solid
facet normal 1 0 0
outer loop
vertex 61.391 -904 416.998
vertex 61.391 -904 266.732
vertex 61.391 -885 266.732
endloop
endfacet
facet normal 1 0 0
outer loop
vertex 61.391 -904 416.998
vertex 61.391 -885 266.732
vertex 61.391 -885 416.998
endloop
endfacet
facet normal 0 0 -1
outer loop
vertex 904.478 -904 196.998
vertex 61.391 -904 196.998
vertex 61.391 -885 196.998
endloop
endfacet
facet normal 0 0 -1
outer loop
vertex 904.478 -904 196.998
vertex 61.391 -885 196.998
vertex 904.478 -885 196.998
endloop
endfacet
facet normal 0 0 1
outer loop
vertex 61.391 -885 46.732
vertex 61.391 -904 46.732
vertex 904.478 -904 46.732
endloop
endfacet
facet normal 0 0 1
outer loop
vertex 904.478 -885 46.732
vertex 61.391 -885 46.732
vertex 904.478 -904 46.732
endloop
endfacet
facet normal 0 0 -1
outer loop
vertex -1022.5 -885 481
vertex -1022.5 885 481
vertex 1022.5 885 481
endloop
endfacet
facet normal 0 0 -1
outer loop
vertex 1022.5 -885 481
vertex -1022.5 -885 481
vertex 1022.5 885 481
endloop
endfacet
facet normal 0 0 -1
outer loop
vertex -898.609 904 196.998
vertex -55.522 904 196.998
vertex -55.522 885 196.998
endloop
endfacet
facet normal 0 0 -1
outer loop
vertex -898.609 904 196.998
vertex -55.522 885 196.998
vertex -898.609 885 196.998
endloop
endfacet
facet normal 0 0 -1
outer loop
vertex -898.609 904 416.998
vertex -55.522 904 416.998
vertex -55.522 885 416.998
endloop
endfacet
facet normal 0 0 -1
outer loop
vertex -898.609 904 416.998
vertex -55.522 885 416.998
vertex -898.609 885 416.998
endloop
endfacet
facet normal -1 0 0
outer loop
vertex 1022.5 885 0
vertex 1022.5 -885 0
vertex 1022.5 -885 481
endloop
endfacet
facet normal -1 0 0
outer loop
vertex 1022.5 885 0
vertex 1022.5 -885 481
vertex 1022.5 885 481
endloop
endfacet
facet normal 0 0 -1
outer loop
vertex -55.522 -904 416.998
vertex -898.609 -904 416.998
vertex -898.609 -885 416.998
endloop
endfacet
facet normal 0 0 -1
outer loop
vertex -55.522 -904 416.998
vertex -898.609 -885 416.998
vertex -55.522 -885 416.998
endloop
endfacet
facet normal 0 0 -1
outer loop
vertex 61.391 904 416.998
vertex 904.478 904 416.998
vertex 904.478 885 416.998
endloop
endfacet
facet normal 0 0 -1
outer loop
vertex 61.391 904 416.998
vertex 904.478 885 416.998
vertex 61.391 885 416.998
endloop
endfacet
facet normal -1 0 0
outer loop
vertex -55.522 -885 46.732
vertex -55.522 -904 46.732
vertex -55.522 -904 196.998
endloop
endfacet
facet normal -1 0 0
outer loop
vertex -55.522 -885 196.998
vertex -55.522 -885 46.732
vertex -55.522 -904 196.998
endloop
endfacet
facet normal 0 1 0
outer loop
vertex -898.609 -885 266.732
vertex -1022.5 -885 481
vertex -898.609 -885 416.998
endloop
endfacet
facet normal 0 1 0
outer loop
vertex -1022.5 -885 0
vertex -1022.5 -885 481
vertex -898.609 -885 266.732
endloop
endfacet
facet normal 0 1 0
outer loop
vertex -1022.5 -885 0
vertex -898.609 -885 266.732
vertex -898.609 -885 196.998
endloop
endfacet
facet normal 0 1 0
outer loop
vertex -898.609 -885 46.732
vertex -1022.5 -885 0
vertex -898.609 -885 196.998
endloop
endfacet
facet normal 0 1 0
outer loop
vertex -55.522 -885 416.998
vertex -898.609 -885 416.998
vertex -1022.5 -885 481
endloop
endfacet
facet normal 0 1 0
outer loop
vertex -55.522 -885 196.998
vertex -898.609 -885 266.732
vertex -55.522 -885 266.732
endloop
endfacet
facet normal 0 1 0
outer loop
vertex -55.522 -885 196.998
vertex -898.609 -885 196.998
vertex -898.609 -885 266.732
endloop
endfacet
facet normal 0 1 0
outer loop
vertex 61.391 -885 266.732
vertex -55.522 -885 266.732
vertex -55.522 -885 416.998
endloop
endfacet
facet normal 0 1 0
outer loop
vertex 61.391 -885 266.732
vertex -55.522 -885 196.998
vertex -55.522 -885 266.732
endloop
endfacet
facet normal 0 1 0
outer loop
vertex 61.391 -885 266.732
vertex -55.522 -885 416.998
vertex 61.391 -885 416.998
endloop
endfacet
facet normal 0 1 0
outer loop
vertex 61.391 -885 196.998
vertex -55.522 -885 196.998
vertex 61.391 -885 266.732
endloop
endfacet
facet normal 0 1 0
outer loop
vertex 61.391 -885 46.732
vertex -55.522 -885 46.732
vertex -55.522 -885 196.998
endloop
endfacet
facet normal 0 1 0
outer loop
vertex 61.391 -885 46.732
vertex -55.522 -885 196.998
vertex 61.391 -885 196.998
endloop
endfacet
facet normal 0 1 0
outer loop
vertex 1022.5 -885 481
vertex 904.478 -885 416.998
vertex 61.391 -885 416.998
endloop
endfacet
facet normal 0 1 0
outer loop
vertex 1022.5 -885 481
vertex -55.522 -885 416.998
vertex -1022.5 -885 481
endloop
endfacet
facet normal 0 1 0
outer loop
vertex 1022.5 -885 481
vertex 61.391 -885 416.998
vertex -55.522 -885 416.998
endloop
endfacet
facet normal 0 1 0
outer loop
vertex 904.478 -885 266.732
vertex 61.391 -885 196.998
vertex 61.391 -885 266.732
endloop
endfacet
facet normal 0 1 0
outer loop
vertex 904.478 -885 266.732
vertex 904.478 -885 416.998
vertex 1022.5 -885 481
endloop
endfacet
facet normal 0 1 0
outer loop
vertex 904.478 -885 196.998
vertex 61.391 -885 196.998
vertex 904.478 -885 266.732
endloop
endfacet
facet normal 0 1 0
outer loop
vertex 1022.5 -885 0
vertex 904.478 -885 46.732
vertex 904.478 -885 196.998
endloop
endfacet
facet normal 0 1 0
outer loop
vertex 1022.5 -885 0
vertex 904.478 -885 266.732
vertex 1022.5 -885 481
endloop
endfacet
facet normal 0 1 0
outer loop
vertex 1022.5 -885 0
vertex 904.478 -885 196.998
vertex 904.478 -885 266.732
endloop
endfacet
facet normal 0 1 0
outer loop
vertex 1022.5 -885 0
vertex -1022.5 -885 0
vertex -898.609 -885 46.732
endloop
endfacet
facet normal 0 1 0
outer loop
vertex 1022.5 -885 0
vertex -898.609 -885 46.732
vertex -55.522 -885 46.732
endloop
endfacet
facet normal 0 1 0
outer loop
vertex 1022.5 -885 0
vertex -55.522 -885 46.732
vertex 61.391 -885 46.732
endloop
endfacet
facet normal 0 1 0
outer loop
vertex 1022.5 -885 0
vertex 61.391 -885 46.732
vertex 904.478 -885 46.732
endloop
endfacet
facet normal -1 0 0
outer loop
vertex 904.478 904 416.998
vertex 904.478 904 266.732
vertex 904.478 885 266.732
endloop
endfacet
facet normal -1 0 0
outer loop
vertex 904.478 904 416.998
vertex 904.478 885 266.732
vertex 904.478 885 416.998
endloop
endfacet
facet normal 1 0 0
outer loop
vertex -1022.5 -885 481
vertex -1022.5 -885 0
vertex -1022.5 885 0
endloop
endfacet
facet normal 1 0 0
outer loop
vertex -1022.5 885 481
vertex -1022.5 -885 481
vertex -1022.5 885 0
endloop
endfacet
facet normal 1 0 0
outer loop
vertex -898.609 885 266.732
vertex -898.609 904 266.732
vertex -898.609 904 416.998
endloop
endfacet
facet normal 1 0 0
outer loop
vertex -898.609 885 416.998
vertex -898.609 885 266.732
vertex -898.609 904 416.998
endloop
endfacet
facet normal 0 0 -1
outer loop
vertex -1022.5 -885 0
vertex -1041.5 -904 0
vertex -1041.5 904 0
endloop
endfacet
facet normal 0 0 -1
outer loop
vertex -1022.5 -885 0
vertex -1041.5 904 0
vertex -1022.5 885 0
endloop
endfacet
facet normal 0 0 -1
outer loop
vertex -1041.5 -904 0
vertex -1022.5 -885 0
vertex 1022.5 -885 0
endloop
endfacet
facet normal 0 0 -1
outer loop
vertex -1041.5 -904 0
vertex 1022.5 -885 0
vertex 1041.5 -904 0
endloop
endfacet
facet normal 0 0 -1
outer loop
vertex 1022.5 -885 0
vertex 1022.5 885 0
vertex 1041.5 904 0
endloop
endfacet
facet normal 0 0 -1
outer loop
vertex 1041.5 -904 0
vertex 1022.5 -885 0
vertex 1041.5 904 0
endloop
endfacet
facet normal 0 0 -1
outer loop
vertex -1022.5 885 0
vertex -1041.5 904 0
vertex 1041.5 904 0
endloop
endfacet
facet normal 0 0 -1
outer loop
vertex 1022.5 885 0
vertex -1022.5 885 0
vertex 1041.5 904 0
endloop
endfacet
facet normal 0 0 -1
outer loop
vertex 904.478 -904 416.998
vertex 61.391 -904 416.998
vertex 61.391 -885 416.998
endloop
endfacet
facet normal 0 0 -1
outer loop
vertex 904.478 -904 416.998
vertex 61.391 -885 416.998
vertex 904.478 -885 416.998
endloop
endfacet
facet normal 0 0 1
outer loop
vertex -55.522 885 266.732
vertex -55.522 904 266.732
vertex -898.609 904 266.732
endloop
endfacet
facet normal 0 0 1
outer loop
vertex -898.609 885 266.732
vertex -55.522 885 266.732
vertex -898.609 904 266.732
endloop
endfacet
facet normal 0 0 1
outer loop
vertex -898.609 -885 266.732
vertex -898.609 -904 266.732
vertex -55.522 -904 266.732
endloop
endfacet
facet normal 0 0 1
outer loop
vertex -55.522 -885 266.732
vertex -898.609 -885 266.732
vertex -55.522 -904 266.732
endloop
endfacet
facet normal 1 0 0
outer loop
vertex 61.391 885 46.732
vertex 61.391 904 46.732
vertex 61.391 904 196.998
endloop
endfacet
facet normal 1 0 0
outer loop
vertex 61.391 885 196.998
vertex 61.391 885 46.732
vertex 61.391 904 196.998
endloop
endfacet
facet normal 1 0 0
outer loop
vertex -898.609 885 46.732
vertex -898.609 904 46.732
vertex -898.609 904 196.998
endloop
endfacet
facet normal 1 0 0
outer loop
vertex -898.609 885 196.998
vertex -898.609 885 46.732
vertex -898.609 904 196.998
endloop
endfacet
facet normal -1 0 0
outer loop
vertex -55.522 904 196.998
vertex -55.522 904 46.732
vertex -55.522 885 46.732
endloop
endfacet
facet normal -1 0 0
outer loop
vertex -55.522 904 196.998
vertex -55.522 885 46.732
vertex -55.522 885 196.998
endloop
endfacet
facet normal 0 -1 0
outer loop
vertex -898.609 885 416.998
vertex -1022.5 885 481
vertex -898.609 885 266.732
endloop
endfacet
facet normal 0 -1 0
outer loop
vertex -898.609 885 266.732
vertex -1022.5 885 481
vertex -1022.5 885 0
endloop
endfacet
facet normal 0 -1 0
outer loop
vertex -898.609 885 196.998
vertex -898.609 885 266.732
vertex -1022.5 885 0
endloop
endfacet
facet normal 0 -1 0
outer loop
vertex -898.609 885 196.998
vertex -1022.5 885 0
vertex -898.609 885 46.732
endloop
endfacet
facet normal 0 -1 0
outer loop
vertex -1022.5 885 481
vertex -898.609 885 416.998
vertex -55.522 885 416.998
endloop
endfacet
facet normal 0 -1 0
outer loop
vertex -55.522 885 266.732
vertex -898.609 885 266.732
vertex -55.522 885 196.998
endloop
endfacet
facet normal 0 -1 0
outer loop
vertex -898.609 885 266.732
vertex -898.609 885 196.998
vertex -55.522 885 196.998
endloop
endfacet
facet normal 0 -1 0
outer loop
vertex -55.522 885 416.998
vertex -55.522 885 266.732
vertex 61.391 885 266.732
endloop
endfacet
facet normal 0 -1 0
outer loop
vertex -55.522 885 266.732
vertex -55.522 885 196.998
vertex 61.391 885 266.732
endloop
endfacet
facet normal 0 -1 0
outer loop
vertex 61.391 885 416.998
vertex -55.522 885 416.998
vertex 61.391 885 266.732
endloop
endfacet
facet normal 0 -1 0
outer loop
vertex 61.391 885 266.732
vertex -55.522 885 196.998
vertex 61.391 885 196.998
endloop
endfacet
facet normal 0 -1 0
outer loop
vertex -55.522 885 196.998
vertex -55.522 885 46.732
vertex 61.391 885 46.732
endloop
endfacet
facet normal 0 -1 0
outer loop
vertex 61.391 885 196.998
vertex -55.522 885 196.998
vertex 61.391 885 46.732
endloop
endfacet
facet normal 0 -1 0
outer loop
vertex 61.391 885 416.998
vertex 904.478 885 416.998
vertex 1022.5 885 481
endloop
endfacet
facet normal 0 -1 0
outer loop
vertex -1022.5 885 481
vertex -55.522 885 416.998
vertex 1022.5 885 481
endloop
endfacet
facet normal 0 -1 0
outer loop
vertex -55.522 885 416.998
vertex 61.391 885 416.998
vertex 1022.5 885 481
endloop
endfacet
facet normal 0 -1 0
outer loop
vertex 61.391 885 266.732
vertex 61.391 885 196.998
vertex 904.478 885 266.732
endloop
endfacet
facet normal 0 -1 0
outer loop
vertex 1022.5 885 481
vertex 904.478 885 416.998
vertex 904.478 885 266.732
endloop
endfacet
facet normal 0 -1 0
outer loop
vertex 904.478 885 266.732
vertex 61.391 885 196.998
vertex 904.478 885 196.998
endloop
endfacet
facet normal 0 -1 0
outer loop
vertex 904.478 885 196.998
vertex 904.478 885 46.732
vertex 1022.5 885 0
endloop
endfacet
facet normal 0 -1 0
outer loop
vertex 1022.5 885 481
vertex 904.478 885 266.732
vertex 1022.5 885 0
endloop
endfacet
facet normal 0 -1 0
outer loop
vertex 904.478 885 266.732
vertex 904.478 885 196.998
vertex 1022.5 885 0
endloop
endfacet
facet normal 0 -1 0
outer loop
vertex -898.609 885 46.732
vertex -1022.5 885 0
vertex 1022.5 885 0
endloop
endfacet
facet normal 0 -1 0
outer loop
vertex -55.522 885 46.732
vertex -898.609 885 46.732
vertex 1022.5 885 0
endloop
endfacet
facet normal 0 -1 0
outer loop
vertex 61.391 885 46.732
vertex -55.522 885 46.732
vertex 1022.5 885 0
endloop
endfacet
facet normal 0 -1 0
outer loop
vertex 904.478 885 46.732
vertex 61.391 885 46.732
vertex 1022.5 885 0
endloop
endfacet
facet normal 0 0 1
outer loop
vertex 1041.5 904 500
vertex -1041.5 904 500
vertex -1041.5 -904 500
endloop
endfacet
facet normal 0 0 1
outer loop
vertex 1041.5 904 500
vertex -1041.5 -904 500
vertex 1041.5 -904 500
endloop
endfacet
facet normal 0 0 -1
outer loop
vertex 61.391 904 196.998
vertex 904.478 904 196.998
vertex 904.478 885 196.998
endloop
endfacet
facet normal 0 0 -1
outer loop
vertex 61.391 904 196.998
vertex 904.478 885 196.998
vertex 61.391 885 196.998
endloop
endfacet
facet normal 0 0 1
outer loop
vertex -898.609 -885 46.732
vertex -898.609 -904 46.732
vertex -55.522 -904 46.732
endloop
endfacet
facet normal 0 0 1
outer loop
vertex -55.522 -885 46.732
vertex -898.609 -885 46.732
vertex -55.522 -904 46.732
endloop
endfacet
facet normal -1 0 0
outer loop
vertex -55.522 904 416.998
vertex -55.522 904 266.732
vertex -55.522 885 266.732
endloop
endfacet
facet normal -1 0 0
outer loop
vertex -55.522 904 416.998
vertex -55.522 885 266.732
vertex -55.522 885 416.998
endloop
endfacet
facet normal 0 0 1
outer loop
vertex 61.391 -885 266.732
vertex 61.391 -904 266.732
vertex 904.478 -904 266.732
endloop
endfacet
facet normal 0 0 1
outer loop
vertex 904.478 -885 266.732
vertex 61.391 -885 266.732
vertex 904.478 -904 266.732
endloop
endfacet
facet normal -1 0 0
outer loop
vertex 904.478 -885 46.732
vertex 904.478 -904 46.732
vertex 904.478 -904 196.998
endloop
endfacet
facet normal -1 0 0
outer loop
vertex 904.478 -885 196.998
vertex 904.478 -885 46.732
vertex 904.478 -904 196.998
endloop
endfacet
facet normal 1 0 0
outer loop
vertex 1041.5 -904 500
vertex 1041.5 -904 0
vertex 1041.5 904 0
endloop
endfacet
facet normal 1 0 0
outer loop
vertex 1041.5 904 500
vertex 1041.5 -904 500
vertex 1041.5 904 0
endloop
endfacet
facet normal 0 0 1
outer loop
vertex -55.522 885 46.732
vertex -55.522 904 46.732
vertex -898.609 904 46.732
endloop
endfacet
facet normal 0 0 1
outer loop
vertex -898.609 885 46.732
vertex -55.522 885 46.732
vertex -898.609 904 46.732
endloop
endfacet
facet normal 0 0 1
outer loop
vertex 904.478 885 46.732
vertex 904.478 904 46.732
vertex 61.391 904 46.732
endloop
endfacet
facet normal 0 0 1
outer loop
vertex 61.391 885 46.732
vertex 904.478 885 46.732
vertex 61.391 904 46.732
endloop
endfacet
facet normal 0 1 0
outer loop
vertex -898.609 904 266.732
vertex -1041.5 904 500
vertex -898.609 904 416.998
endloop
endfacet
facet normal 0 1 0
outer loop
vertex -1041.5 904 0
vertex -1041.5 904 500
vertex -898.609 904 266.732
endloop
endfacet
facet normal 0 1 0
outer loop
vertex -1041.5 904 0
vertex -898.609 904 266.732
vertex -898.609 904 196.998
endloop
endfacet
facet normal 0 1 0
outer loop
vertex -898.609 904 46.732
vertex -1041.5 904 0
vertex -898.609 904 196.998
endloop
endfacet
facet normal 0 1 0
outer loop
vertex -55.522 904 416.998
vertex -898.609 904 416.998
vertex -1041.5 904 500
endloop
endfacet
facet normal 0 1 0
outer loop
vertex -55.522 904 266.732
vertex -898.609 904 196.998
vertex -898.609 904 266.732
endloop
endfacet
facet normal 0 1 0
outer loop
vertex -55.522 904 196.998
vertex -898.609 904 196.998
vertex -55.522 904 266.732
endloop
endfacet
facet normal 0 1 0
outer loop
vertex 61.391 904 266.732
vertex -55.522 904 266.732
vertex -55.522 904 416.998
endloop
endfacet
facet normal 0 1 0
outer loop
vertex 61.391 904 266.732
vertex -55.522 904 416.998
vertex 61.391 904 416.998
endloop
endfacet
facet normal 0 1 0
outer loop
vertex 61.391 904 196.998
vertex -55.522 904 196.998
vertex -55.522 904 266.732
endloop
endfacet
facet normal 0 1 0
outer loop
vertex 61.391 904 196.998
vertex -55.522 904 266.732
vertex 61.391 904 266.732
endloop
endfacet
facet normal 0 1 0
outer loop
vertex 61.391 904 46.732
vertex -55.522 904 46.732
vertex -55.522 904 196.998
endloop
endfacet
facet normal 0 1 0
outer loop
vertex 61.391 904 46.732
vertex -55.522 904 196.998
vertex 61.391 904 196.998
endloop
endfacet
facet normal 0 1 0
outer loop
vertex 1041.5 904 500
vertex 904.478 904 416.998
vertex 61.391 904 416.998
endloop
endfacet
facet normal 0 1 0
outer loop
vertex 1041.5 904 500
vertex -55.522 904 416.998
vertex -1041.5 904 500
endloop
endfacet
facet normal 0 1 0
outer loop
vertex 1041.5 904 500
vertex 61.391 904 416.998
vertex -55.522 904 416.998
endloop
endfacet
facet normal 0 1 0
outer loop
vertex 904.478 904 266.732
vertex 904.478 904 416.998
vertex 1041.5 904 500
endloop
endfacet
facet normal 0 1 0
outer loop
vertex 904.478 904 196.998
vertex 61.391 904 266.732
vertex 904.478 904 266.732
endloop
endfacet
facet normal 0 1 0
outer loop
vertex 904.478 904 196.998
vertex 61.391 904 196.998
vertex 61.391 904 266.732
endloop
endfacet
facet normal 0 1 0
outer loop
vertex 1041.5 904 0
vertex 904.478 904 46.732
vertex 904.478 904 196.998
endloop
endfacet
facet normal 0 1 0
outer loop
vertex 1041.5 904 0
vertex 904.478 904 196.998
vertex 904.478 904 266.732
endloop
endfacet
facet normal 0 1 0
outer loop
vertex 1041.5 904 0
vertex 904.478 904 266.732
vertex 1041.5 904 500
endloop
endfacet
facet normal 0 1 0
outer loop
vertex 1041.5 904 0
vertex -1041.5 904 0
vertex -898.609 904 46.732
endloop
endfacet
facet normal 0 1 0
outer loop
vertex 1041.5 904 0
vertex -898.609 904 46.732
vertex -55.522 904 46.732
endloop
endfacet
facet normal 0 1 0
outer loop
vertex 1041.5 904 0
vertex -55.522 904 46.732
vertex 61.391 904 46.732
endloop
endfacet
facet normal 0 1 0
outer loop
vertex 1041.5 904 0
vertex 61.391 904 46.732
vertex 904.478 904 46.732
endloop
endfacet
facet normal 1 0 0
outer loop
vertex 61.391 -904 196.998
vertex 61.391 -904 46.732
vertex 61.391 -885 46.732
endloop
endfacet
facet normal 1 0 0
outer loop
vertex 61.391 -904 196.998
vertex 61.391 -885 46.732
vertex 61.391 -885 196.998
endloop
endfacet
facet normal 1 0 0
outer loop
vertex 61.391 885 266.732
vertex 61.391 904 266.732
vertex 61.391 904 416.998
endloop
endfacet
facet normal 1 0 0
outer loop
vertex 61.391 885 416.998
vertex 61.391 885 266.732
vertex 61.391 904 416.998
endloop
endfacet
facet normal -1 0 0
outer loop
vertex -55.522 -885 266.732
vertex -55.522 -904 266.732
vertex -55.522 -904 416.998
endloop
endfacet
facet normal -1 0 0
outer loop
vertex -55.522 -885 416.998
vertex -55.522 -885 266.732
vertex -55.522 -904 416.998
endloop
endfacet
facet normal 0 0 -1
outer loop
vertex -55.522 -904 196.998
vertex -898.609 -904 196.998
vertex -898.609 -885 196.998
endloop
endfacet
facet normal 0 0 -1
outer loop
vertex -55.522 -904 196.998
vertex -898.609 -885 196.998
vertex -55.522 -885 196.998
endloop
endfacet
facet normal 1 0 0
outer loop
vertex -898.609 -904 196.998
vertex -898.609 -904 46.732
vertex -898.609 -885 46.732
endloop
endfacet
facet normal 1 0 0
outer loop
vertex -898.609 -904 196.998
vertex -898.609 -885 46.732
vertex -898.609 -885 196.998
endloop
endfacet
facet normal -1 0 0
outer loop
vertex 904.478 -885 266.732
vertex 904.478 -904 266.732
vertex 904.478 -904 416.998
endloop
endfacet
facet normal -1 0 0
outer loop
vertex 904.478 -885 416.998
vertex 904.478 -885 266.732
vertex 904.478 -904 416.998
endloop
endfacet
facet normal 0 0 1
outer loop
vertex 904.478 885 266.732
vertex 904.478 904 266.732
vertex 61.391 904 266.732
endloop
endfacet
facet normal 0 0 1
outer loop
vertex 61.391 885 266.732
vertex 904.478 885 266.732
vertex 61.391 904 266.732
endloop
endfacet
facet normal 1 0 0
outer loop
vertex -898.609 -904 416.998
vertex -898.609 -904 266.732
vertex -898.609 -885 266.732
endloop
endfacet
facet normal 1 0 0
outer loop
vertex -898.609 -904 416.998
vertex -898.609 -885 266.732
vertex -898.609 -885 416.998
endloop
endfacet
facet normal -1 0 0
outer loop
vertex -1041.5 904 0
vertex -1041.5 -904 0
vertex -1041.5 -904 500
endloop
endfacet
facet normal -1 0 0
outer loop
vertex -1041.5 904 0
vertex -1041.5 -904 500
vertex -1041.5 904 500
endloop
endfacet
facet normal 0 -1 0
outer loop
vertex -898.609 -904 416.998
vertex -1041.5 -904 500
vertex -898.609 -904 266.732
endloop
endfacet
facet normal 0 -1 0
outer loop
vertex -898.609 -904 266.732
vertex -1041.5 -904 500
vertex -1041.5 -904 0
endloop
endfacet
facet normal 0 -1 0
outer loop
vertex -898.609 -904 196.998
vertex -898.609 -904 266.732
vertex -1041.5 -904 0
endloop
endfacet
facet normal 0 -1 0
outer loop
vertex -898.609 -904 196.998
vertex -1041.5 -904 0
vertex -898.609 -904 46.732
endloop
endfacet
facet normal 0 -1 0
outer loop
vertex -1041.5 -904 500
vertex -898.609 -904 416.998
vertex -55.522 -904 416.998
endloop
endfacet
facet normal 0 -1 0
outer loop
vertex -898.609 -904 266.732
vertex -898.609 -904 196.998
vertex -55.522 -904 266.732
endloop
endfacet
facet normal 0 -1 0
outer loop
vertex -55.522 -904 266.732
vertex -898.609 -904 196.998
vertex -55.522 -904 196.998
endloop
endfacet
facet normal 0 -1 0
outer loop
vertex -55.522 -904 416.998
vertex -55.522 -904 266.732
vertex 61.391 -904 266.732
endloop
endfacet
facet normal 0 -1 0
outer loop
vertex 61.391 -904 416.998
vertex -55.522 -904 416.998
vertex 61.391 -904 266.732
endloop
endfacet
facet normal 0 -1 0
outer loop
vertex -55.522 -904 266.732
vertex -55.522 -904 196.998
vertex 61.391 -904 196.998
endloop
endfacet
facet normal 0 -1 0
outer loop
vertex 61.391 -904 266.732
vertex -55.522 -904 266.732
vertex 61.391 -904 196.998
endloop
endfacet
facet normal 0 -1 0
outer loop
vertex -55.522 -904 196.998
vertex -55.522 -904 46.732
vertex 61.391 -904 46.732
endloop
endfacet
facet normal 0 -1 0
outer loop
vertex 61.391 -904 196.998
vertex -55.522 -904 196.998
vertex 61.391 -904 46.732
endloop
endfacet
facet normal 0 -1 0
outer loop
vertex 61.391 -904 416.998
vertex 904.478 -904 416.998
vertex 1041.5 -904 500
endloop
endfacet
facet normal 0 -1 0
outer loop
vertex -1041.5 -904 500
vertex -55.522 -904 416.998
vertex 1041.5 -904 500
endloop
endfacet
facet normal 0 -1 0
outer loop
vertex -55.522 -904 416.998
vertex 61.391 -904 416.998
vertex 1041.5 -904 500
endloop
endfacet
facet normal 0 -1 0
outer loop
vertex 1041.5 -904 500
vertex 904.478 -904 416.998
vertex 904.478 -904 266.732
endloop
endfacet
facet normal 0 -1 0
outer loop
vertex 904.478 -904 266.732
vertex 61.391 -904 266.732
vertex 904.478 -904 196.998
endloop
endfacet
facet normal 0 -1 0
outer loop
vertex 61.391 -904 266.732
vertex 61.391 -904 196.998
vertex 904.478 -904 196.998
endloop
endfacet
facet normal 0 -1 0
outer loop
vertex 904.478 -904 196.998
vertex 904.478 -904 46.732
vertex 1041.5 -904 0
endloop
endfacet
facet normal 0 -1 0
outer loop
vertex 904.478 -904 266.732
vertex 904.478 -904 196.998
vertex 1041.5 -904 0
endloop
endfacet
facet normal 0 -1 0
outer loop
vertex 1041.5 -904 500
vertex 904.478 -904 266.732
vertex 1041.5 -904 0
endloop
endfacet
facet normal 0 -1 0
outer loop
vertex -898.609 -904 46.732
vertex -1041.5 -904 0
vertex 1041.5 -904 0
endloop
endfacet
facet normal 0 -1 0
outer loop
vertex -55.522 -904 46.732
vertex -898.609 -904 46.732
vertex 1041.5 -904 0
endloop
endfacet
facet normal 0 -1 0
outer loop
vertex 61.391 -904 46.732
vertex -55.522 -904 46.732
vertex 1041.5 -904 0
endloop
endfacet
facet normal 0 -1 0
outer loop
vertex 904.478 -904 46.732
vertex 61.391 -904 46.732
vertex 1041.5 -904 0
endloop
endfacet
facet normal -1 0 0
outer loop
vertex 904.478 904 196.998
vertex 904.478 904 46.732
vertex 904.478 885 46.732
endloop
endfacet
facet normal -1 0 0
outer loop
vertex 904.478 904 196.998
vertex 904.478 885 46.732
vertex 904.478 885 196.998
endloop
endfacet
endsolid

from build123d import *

# Parameters (mm, degrees)
F0_W     = 2083
F0_H     = 1808
F1_DEPTH = 500
F2_T     = -19
F3_W     = 843.087125
F3_H     = 150.265902
F4_DEPTH = 19
F5_W     = 843.087125
F5_H     = 150.265902
F6_DEPTH = 19


with BuildPart() as f1:
    # F0 (on Top) → F1 (new body)
    with BuildSketch(Plane.XY):
        Rectangle(F0_W, F0_H)
    extrude(amount=F1_DEPTH)

    # F2
    f2_openings = [f1.faces().sort_by_distance(p)[0] for p in [
        (0, 0, 0),
    ]]
    offset(amount=F2_T, openings=f2_openings)

    # F3 (on face) → F4 (cut, through all)
    with BuildSketch(Plane.XZ.offset(904)):
        with Locations((-477.065479, 341.865197)):
            Rectangle(F3_W, F3_H)
        with Locations((482.93452, 341.865197)):
            Rectangle(F3_W, F3_H)
        with Locations((-477.065479, 121.865197)):
            Rectangle(F3_W, F3_H)
        with Locations((482.93452, 121.865197)):
            Rectangle(F3_W, F3_H)
    extrude(amount=-F4_DEPTH, mode=Mode.SUBTRACT)

    # F5 (on face) → F6 (cut, through all)
    with BuildSketch(Plane(origin=(0, 904, 0), x_dir=(-1, 0, 0), z_dir=(0, 1, 0))):
        with Locations((-482.93452, 341.865197)):
            Rectangle(F5_W, F5_H)
        with Locations((477.065479, 341.865197)):
            Rectangle(F5_W, F5_H)
        with Locations((-482.93452, 121.865197)):
            Rectangle(F5_W, F5_H)
        with Locations((477.065479, 121.865197)):
            Rectangle(F5_W, F5_H)
    extrude(amount=-F6_DEPTH, mode=Mode.SUBTRACT)


solid = f1.part
